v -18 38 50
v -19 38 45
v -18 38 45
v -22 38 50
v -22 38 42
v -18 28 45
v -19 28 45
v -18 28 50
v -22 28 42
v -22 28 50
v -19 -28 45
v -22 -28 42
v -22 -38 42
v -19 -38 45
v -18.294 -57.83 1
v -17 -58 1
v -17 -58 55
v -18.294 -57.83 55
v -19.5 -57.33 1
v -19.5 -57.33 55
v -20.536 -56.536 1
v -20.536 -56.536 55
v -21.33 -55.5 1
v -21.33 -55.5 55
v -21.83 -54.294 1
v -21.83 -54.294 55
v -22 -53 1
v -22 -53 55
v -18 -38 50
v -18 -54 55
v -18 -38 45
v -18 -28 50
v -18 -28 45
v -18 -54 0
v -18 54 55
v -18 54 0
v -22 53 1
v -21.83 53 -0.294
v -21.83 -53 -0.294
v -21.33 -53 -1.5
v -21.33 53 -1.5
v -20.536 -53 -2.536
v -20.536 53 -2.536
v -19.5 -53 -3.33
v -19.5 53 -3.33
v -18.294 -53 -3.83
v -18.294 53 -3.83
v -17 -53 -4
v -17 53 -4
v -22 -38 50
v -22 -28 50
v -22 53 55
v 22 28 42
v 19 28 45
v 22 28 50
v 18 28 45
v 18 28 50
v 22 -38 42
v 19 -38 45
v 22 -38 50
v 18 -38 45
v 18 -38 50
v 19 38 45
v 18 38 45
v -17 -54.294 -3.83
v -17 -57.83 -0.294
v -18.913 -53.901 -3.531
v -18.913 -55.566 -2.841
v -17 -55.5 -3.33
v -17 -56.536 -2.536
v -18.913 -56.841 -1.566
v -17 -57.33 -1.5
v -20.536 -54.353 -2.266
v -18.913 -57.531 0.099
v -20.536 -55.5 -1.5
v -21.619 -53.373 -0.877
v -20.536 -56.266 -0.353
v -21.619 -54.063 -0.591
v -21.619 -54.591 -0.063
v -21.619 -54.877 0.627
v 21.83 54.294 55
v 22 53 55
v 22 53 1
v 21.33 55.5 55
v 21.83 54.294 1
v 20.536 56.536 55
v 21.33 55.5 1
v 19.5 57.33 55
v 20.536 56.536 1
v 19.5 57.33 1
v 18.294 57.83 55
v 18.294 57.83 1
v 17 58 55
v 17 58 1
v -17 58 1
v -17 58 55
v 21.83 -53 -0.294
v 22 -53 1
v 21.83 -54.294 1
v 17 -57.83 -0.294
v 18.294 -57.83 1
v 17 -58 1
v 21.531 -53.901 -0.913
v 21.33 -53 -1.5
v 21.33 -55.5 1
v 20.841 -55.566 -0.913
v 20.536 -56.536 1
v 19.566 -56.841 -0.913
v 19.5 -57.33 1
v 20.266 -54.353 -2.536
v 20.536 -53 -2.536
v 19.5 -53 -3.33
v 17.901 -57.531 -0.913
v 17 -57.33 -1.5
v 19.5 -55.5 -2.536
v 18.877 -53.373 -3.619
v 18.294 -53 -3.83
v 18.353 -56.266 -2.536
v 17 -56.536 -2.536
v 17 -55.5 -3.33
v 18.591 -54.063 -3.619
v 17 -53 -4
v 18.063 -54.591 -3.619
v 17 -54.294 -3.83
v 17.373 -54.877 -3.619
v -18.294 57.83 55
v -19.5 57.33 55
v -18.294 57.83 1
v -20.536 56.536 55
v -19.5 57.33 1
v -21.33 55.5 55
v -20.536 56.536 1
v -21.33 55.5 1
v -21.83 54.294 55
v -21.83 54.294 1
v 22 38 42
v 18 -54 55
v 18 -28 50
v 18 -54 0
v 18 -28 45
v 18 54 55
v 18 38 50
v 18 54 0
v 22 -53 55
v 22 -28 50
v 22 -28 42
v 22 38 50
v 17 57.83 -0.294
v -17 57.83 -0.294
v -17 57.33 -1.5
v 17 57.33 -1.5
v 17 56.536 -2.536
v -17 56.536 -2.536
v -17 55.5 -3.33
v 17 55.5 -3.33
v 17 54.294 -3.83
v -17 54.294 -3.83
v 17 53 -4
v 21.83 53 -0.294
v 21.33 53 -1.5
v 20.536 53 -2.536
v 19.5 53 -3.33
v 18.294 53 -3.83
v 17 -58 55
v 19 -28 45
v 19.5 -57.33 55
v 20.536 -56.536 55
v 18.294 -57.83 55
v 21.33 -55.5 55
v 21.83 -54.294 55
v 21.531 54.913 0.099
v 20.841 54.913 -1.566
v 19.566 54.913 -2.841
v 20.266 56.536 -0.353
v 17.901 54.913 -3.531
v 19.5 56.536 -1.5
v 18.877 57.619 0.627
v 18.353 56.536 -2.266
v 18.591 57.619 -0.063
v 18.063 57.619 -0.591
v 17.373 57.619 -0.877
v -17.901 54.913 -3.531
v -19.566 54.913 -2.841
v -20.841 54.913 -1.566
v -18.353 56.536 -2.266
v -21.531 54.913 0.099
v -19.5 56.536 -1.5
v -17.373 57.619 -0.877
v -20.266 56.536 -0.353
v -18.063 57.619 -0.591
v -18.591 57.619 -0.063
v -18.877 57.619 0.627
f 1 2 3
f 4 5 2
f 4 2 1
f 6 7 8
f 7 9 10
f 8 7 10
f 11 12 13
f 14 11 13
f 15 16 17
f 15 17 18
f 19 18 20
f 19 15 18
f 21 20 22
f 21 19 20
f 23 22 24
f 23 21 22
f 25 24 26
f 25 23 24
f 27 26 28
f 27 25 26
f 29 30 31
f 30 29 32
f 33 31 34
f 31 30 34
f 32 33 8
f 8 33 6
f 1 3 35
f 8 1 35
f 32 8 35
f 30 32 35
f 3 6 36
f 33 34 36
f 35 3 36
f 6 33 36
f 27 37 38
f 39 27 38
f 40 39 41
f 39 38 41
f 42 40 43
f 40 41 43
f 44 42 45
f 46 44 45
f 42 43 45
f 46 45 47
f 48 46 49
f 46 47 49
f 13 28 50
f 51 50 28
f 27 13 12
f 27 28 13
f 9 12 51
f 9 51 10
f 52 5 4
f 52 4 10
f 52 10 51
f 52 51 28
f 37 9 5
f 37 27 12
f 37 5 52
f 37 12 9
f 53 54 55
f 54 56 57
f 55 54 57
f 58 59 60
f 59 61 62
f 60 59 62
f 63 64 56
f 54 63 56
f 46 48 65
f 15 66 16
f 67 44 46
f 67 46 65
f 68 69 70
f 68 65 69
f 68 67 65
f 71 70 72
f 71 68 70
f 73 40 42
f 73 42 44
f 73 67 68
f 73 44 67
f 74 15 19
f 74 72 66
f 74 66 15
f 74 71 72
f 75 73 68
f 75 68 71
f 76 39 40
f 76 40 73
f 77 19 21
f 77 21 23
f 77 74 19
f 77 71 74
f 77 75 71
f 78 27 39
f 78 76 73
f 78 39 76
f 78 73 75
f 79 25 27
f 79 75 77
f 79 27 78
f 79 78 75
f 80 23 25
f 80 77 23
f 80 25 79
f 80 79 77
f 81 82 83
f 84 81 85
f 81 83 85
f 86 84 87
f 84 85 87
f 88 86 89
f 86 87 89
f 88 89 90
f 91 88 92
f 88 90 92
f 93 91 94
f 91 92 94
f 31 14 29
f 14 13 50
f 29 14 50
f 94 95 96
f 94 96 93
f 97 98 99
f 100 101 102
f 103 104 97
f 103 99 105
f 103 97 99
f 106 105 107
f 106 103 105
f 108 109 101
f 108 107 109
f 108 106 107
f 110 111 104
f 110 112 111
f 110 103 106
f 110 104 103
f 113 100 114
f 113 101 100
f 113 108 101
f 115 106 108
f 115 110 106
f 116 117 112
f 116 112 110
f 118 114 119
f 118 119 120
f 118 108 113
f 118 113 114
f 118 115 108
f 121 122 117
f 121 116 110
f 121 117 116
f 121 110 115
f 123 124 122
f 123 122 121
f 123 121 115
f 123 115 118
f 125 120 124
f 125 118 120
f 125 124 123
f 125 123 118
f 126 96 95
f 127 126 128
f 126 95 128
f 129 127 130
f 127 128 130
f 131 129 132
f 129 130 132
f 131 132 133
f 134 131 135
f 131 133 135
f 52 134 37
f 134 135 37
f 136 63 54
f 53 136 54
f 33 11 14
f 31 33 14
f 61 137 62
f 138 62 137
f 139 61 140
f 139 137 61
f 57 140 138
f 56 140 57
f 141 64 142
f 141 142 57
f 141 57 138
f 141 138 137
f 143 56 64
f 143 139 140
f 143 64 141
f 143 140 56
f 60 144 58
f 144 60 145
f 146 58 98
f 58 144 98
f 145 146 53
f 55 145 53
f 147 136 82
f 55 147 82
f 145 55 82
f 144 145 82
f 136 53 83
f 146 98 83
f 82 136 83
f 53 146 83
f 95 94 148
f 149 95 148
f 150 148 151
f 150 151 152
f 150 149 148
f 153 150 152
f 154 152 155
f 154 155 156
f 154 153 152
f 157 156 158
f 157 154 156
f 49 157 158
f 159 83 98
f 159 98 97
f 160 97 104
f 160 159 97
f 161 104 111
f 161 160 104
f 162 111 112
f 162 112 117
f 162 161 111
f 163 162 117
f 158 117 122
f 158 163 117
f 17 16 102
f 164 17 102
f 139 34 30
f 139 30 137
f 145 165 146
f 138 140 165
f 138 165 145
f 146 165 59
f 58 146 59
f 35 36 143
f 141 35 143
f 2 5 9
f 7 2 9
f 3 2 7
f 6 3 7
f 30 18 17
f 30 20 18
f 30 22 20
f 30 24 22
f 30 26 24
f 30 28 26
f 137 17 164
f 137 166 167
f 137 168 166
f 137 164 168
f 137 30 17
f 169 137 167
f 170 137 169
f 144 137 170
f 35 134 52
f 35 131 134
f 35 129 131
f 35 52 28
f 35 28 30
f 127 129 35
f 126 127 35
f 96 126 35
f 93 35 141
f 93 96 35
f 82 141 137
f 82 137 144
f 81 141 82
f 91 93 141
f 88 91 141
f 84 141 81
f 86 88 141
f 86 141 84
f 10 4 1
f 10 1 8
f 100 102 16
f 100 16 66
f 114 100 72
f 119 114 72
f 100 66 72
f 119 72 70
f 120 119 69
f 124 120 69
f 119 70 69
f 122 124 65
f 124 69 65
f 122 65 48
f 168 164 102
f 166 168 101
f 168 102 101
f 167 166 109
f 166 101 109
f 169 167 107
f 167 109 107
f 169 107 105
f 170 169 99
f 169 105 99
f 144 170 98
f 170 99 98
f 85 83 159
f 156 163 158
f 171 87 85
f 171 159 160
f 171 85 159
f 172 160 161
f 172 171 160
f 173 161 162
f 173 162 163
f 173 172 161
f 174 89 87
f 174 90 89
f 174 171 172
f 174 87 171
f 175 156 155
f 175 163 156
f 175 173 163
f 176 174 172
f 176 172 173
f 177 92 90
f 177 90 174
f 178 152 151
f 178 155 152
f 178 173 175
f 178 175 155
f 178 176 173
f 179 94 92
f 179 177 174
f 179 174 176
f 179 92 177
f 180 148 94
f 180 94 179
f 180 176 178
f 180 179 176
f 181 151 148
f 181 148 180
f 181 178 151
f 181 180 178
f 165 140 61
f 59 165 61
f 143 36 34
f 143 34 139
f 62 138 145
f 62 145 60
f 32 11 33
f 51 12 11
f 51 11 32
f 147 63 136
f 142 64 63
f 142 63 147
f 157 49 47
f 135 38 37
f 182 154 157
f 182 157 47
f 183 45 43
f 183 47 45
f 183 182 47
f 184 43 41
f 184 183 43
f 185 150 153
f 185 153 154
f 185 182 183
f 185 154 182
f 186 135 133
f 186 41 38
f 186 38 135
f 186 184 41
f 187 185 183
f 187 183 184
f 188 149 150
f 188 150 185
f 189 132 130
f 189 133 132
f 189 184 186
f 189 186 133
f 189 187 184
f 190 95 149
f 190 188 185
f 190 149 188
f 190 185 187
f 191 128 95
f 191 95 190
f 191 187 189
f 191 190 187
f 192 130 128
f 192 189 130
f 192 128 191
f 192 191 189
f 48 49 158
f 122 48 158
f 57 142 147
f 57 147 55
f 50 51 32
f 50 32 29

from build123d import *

# Parameters (mm, degrees)
F0_W         = 36
F0_H         = 108
F1_DEPTH     = 55
F2_T         = 4
F3_T1_DEPTH  = 66.5
F3_T3_DEPTH  = 34
F3_T5_DEPTH  = 106
F3_S9_W      = 5
F3_S9_H      = 5
F3_T10_DEPTH = 5
F3_S15_W     = 5
F3_S15_H     = 5
F3_T16_DEPTH = 5
F3_S21_W     = 5
F3_S21_H     = 5
F3_T22_DEPTH = 5
F3_S27_W     = 5
F3_S27_H     = 5
F3_T28_DEPTH = 5
F4_W         = 10
F4_H         = 5
F5_DEPTH     = 44.001
F6_SIZE      = 3


# Not quite as in the source:
# - a fillet or chamfer that OpenCascade refuses, or shapes differently, is made with other operations: its cross-section is extruded or revolved along the edge and cut away or added


with BuildPart() as f1:
    # F0 (on Top) → F1 (new body)
    with BuildSketch(Plane.XY):
        Rectangle(F0_W, F0_H)
    extrude(amount=F1_DEPTH)

    # F2
    f2_openings = [f1.faces().sort_by_distance(p)[0] for p in [
        (0, 0, 55),
    ]]
    offset(amount=F2_T, openings=f2_openings, kind=Kind.INTERSECTION)

    # F3: fillet of radius 5 on 8 edges, made by hand

    # F3_s2 → F3_t1 (cut)
    with BuildSketch(Plane.XY.offset(1)):
        with BuildLine():
            ThreePointArc((-17, -58), (-20.5355339059, -56.5355339059), (-22, -53))
            Line((-22, -53), (-22, -58))
            Line((-22, -58), (-17, -58))
        make_face()
        with BuildLine():
            ThreePointArc((17, -58), (20.5355339059, -56.5355339059), (22, -53))
            Line((22, -53), (22, -58))
            Line((22, -58), (17, -58))
        make_face()
        with BuildLine():
            ThreePointArc((22, 53), (20.5355339059, 56.5355339059), (17, 58))
            Line((17, 58), (22, 58))
            Line((22, 58), (22, 53))
        make_face()
        with BuildLine():
            ThreePointArc((-17, 58), (-20.5355339059, 56.5355339059), (-22, 53))
            Line((-22, 53), (-22, 58))
            Line((-22, 58), (-17, 58))
        make_face()
    extrude(amount=F3_T1_DEPTH, mode=Mode.SUBTRACT)

    # F3_s4 → F3_t3 (cut)
    with BuildSketch(Plane.YZ.offset(-17)):
        with BuildLine():
            ThreePointArc((-58, 1), (-56.5355339059, -2.5355339059), (-53, -4))
            Line((-53, -4), (-58, -4))
            Line((-58, -4), (-58, 1))
        make_face()
        with BuildLine():
            ThreePointArc((58, 1), (56.5355339059, -2.5355339059), (53, -4))
            Line((53, -4), (58, -4))
            Line((58, -4), (58, 1))
        make_face()
    extrude(amount=F3_T3_DEPTH, mode=Mode.SUBTRACT)

    # F3_s6 → F3_t5 (cut)
    with BuildSketch(Plane.XZ.offset(-53)):
        with BuildLine():
            ThreePointArc((22, 1), (20.5355339059, -2.5355339059), (17, -4))
            Line((17, -4), (22, -4))
            Line((22, -4), (22, 1))
        make_face()
        with BuildLine():
            ThreePointArc((-22, 1), (-20.5355339059, -2.5355339059), (-17, -4))
            Line((-17, -4), (-22, -4))
            Line((-22, -4), (-22, 1))
        make_face()
    extrude(amount=F3_T5_DEPTH, mode=Mode.SUBTRACT)


with BuildPart() as f3_tool8:
    # F3_s9 → F3_t10 (new body)
    with BuildSketch(Plane.YZ.offset(-17)):
        with Locations((-55.5, -1.5)):
            Rectangle(F3_S9_W, F3_S9_H)
    extrude(amount=-F3_T10_DEPTH)

    # F3_s11 → F3_t12 (revolve, cut)
    with BuildSketch(Plane(origin=(-17, -53, 1), x_dir=(0, 0.7071067812, 0.7071067812), z_dir=(0, -0.7071067812, 0.7071067812))):
        with BuildLine():
            ThreePointArc((0, -5), (5, 0), (0, 5))
            Line((0, 5), (0, -5))
        make_face()
    revolve(axis=Axis((-17, -53, 1), (-1, 0, 0)), mode=Mode.SUBTRACT)


with BuildPart() as f1_1:
    add(f1.part)

    # F3_t7: cut F3_tool8
    add(f3_tool8.part, mode=Mode.SUBTRACT)


with BuildPart() as f3_tool14:
    # F3_s15 → F3_t16 (new body)
    with BuildSketch(Plane.XY.offset(1)):
        with Locations((19.5, -55.5)):
            Rectangle(F3_S15_W, F3_S15_H)
    extrude(amount=-F3_T16_DEPTH)

    # F3_s17 → F3_t18 (revolve, cut)
    with BuildSketch(Plane(origin=(17, -53, 1), x_dir=(-0.7071067812, 0.7071067812, 0), z_dir=(-0.7071067812, -0.7071067812, 0))):
        with BuildLine():
            ThreePointArc((0, -5), (5, 0), (0, 5))
            Line((0, 5), (0, -5))
        make_face()
    revolve(axis=Axis((17, -53, 1), (0, 0, -1)), mode=Mode.SUBTRACT)


with BuildPart() as f1_2:
    add(f1_1.part)

    # F3_t13: cut F3_tool14
    add(f3_tool14.part, mode=Mode.SUBTRACT)


with BuildPart() as f3_tool20:
    # F3_s21 → F3_t22 (new body)
    with BuildSketch(Plane.XZ.offset(-53)):
        with Locations((19.5, -1.5)):
            Rectangle(F3_S21_W, F3_S21_H)
    extrude(amount=-F3_T22_DEPTH)

    # F3_s23 → F3_t24 (revolve, cut)
    with BuildSketch(Plane(origin=(17, 53, 1), x_dir=(-0.7071067812, 0, 0.7071067812), z_dir=(-0.7071067812, 0, -0.7071067812))):
        with BuildLine():
            ThreePointArc((0, -5), (5, 0), (0, 5))
            Line((0, 5), (0, -5))
        make_face()
    revolve(axis=Axis((17, 53, 1), (0, 1, 0)), mode=Mode.SUBTRACT)


with BuildPart() as f1_3:
    add(f1_2.part)

    # F3_t19: cut F3_tool20
    add(f3_tool20.part, mode=Mode.SUBTRACT)


with BuildPart() as f3_tool26:
    # F3_s27 → F3_t28 (new body)
    with BuildSketch(Plane.XZ.offset(-53)):
        with Locations((-19.5, -1.5)):
            Rectangle(F3_S27_W, F3_S27_H)
    extrude(amount=-F3_T28_DEPTH)

    # F3_s29 → F3_t30 (revolve, cut)
    with BuildSketch(Plane(origin=(-17, 53, 1), x_dir=(0.7071067812, 0, 0.7071067812), z_dir=(-0.7071067812, 0, 0.7071067812))):
        with BuildLine():
            ThreePointArc((0, -5), (5, 0), (0, 5))
            Line((0, 5), (0, -5))
        make_face()
    revolve(axis=Axis((-17, 53, 1), (0, 1, 0)), mode=Mode.SUBTRACT)


with BuildPart() as f1_4:
    add(f1_3.part)

    # F3_t25: cut F3_tool26
    add(f3_tool26.part, mode=Mode.SUBTRACT)

    # F4 (on face) → F5 (cut, through all)
    with BuildSketch(Plane(origin=(-22, 0, 0), x_dir=(0, -1, 0), z_dir=(-1, 0, 0))):
        with Locations((-33, 47.5)):
            Rectangle(F4_W, F4_H)
        with Locations((33, 47.5)):
            Rectangle(F4_W, F4_H)
    extrude(amount=-F5_DEPTH, mode=Mode.SUBTRACT)

    # F6
    f6_edges = [f1_4.edges().sort_by_distance(p)[0] for p in [
        (-22, 33, 45),
        (-22, -33, 45),
        (22, -33, 45),
        (22, 33, 45),
    ]]
    chamfer(f6_edges, length=F6_SIZE)


solid = f1_4.part
